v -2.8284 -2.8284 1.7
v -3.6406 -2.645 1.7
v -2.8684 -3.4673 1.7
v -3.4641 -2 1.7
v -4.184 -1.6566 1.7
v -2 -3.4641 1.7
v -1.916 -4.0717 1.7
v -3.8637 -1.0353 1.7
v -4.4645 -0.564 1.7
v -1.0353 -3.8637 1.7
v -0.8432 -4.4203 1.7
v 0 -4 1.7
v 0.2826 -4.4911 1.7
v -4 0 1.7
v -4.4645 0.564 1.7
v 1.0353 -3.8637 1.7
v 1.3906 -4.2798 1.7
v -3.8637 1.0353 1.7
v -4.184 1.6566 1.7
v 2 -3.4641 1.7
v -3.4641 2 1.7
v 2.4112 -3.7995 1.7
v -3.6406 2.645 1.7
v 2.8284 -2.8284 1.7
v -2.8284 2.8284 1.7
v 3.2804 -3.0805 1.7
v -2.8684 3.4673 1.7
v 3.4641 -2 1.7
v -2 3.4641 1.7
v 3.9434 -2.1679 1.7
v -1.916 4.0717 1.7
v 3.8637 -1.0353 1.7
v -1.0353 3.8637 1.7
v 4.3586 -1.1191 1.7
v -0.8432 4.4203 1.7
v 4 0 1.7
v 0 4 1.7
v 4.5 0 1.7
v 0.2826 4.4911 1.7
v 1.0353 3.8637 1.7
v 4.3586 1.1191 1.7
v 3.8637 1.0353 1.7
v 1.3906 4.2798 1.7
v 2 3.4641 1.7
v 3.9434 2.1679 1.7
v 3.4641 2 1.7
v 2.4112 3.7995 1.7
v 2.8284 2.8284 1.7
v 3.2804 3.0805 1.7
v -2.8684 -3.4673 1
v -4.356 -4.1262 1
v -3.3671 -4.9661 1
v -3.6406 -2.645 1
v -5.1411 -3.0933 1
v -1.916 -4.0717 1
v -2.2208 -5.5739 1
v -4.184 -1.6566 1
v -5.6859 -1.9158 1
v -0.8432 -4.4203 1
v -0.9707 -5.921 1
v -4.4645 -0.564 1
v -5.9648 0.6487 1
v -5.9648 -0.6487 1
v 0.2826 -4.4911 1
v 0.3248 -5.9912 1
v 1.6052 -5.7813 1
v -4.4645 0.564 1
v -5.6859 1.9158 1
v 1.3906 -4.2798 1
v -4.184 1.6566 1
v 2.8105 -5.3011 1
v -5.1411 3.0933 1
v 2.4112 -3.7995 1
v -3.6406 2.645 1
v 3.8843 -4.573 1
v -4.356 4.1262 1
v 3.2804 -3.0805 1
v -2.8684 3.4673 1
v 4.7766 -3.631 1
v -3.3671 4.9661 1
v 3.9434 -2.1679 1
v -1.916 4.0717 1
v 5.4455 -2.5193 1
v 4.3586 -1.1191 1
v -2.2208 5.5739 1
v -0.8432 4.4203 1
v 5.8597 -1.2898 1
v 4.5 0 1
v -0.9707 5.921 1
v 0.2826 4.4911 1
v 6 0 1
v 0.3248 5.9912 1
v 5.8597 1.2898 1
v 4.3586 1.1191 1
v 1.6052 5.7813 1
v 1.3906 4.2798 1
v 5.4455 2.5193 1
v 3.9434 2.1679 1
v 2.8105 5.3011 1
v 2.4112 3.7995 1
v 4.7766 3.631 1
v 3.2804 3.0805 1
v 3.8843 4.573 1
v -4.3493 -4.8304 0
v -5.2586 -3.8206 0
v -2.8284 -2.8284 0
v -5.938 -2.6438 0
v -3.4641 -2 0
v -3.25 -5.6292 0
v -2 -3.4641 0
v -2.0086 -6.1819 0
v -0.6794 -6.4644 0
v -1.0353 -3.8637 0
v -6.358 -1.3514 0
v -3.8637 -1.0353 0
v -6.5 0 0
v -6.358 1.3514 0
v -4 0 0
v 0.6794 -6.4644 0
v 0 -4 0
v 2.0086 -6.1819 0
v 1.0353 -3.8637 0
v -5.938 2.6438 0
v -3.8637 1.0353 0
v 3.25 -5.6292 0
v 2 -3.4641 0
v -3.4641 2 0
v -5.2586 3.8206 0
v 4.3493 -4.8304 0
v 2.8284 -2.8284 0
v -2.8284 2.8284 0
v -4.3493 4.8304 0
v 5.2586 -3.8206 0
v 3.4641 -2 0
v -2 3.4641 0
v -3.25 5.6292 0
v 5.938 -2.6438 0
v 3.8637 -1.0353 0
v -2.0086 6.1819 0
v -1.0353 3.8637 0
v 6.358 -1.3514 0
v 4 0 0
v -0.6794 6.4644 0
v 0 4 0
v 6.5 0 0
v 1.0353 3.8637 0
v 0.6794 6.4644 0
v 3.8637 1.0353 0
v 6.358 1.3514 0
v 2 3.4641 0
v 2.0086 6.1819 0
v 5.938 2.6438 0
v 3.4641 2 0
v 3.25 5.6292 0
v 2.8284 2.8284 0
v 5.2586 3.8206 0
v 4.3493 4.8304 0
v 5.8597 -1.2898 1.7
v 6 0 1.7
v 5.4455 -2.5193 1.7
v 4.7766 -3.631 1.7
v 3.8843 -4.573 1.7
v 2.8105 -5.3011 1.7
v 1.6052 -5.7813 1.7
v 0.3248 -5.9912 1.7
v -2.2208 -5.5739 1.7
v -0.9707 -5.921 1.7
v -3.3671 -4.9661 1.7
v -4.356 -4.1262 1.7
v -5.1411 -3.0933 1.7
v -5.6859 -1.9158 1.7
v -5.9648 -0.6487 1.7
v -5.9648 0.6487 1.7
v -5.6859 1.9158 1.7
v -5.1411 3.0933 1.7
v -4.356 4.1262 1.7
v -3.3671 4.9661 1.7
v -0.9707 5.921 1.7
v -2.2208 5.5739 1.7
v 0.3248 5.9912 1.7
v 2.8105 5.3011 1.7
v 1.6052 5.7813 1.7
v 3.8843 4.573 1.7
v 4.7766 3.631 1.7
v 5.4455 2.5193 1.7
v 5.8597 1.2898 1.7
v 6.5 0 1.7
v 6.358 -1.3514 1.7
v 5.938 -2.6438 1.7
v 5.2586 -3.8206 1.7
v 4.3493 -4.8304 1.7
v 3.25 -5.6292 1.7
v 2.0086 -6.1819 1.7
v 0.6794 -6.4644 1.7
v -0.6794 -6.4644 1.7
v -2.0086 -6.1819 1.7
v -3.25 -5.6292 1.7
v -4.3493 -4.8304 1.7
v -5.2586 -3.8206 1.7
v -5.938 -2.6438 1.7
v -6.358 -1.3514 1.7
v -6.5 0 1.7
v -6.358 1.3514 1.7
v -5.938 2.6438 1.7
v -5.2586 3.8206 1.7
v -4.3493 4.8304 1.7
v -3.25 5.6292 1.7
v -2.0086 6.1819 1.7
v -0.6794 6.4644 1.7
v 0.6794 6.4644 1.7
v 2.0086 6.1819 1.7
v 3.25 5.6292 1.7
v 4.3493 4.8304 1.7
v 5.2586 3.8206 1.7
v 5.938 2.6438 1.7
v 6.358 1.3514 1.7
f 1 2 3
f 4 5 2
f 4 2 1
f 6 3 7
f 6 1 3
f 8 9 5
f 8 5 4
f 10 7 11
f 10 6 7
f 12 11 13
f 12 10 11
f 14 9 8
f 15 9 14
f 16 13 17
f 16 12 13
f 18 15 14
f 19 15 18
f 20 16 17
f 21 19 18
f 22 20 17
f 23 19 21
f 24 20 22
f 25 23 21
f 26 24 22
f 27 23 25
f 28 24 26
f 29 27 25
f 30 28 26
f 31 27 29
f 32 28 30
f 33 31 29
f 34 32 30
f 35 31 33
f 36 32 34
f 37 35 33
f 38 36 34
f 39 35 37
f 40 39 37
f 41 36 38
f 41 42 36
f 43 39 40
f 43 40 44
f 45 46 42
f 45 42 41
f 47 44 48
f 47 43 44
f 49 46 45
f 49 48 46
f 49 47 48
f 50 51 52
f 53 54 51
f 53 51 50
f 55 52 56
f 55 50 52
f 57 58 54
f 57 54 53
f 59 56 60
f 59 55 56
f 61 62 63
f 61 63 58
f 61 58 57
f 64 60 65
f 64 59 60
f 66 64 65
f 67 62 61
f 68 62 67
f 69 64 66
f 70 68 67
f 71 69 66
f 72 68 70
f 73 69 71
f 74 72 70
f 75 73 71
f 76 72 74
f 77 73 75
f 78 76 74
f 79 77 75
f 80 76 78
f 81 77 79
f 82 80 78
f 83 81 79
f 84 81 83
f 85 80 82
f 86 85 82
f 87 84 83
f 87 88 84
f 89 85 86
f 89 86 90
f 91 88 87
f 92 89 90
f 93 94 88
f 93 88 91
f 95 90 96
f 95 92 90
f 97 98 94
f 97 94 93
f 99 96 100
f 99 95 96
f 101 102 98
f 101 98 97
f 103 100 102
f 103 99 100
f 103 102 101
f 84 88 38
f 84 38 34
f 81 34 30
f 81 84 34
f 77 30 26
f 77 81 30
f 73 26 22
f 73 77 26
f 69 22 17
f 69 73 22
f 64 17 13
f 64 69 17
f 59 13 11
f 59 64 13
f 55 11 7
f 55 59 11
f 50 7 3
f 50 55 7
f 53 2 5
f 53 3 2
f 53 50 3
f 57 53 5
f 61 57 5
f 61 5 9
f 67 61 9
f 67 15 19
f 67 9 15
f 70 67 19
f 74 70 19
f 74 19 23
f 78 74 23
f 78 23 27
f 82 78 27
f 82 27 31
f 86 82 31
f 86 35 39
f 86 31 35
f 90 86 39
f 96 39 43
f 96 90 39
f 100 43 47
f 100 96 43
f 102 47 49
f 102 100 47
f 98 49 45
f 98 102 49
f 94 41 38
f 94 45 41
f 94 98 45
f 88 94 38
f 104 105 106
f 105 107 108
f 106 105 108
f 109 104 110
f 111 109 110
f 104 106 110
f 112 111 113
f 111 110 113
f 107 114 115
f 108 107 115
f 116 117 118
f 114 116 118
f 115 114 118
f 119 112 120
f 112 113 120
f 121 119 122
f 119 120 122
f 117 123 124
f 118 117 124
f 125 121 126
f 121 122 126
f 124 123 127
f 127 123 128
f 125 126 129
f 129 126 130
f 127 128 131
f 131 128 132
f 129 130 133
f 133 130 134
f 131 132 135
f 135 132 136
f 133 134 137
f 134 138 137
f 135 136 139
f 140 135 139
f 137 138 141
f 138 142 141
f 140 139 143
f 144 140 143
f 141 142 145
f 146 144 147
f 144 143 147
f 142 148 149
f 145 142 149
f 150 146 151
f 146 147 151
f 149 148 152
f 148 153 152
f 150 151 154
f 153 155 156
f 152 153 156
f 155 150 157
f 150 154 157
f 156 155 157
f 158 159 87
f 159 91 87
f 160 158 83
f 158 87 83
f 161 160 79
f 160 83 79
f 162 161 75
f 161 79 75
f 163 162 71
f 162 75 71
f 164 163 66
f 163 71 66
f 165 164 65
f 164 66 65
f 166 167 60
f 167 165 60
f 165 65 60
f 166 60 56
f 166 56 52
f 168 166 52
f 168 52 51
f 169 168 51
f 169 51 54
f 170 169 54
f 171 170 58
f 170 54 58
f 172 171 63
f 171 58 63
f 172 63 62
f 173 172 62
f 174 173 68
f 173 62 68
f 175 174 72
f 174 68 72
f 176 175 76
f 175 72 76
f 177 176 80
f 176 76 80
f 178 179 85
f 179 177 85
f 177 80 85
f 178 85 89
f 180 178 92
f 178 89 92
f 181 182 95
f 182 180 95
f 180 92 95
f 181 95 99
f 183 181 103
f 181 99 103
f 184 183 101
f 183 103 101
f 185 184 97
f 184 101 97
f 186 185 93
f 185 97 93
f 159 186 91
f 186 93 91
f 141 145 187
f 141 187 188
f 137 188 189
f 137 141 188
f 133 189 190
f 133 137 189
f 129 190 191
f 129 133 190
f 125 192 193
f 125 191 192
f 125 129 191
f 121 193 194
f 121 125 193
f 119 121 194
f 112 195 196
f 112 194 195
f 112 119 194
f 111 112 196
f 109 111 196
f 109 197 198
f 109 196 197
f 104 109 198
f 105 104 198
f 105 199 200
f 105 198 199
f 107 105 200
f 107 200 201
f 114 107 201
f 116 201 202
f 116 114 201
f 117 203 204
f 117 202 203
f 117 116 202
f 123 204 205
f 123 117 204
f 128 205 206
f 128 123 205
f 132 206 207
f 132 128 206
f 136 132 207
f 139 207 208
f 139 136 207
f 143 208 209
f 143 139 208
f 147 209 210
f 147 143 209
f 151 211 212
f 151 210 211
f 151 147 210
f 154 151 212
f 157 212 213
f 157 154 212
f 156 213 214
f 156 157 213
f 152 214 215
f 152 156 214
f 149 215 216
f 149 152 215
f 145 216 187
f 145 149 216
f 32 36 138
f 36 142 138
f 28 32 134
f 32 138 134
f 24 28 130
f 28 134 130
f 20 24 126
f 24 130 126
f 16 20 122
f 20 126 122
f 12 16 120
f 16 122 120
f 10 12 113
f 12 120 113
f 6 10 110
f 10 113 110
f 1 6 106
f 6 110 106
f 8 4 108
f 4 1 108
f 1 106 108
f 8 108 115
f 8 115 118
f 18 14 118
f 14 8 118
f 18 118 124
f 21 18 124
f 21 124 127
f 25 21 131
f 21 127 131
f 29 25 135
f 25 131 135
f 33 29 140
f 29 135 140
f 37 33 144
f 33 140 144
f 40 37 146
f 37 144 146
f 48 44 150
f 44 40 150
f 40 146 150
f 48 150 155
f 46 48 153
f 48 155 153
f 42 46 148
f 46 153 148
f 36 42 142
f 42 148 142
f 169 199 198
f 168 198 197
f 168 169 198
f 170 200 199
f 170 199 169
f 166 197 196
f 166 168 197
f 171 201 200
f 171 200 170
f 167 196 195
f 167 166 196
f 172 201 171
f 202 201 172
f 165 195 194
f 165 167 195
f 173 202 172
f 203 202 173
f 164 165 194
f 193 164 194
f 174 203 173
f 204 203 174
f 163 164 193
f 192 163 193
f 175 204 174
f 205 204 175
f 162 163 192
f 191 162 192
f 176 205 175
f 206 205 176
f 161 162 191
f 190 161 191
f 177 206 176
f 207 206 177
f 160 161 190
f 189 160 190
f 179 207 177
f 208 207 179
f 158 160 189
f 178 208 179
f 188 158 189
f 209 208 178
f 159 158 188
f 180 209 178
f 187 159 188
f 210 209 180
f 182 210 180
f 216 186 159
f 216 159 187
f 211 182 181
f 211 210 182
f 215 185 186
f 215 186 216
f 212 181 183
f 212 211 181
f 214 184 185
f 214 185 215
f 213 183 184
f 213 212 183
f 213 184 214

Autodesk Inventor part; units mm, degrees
ref_plane "YZ Plane" through (0, 0, 0) normal (1, 0, 0) x (0, 1, 0)
ref_plane "XZ Plane" through (0, 0, 0) normal (0, 1, 0) x (-1, 0, 0)
ref_plane "XY Plane" through (0, 0, 0) normal (0, 0, 1) x (1, 0, 0)
sketch "Эскиз1" plane through (0, 0, 0) normal (0, 0, 1) x (1, 0, 0)
  circle A0 centre (0, 0) radius 4 projected
  circle A1 centre (0, 0) radius 6.5 projected
extrude "Выдавливание1" add sketch "Эскиз1" along normal blind 1
sketch "Эскиз2" plane through (0, 0, 1) normal (0, 0, 1) x (1, 0, 0)
  circle A0 centre (0, 0) radius 4 projected
  circle A1 centre (0, 0) radius 6.5 projected
  circle A2 centre (0, 0) radius 6
  circle A3 centre (0, 0) radius 4.5
  dimension "d2" = 12
  dimension "d3" = 9
extrude "Выдавливание2" add sketch "Эскиз2" along normal blind 0.7
properties part number "Cap"
